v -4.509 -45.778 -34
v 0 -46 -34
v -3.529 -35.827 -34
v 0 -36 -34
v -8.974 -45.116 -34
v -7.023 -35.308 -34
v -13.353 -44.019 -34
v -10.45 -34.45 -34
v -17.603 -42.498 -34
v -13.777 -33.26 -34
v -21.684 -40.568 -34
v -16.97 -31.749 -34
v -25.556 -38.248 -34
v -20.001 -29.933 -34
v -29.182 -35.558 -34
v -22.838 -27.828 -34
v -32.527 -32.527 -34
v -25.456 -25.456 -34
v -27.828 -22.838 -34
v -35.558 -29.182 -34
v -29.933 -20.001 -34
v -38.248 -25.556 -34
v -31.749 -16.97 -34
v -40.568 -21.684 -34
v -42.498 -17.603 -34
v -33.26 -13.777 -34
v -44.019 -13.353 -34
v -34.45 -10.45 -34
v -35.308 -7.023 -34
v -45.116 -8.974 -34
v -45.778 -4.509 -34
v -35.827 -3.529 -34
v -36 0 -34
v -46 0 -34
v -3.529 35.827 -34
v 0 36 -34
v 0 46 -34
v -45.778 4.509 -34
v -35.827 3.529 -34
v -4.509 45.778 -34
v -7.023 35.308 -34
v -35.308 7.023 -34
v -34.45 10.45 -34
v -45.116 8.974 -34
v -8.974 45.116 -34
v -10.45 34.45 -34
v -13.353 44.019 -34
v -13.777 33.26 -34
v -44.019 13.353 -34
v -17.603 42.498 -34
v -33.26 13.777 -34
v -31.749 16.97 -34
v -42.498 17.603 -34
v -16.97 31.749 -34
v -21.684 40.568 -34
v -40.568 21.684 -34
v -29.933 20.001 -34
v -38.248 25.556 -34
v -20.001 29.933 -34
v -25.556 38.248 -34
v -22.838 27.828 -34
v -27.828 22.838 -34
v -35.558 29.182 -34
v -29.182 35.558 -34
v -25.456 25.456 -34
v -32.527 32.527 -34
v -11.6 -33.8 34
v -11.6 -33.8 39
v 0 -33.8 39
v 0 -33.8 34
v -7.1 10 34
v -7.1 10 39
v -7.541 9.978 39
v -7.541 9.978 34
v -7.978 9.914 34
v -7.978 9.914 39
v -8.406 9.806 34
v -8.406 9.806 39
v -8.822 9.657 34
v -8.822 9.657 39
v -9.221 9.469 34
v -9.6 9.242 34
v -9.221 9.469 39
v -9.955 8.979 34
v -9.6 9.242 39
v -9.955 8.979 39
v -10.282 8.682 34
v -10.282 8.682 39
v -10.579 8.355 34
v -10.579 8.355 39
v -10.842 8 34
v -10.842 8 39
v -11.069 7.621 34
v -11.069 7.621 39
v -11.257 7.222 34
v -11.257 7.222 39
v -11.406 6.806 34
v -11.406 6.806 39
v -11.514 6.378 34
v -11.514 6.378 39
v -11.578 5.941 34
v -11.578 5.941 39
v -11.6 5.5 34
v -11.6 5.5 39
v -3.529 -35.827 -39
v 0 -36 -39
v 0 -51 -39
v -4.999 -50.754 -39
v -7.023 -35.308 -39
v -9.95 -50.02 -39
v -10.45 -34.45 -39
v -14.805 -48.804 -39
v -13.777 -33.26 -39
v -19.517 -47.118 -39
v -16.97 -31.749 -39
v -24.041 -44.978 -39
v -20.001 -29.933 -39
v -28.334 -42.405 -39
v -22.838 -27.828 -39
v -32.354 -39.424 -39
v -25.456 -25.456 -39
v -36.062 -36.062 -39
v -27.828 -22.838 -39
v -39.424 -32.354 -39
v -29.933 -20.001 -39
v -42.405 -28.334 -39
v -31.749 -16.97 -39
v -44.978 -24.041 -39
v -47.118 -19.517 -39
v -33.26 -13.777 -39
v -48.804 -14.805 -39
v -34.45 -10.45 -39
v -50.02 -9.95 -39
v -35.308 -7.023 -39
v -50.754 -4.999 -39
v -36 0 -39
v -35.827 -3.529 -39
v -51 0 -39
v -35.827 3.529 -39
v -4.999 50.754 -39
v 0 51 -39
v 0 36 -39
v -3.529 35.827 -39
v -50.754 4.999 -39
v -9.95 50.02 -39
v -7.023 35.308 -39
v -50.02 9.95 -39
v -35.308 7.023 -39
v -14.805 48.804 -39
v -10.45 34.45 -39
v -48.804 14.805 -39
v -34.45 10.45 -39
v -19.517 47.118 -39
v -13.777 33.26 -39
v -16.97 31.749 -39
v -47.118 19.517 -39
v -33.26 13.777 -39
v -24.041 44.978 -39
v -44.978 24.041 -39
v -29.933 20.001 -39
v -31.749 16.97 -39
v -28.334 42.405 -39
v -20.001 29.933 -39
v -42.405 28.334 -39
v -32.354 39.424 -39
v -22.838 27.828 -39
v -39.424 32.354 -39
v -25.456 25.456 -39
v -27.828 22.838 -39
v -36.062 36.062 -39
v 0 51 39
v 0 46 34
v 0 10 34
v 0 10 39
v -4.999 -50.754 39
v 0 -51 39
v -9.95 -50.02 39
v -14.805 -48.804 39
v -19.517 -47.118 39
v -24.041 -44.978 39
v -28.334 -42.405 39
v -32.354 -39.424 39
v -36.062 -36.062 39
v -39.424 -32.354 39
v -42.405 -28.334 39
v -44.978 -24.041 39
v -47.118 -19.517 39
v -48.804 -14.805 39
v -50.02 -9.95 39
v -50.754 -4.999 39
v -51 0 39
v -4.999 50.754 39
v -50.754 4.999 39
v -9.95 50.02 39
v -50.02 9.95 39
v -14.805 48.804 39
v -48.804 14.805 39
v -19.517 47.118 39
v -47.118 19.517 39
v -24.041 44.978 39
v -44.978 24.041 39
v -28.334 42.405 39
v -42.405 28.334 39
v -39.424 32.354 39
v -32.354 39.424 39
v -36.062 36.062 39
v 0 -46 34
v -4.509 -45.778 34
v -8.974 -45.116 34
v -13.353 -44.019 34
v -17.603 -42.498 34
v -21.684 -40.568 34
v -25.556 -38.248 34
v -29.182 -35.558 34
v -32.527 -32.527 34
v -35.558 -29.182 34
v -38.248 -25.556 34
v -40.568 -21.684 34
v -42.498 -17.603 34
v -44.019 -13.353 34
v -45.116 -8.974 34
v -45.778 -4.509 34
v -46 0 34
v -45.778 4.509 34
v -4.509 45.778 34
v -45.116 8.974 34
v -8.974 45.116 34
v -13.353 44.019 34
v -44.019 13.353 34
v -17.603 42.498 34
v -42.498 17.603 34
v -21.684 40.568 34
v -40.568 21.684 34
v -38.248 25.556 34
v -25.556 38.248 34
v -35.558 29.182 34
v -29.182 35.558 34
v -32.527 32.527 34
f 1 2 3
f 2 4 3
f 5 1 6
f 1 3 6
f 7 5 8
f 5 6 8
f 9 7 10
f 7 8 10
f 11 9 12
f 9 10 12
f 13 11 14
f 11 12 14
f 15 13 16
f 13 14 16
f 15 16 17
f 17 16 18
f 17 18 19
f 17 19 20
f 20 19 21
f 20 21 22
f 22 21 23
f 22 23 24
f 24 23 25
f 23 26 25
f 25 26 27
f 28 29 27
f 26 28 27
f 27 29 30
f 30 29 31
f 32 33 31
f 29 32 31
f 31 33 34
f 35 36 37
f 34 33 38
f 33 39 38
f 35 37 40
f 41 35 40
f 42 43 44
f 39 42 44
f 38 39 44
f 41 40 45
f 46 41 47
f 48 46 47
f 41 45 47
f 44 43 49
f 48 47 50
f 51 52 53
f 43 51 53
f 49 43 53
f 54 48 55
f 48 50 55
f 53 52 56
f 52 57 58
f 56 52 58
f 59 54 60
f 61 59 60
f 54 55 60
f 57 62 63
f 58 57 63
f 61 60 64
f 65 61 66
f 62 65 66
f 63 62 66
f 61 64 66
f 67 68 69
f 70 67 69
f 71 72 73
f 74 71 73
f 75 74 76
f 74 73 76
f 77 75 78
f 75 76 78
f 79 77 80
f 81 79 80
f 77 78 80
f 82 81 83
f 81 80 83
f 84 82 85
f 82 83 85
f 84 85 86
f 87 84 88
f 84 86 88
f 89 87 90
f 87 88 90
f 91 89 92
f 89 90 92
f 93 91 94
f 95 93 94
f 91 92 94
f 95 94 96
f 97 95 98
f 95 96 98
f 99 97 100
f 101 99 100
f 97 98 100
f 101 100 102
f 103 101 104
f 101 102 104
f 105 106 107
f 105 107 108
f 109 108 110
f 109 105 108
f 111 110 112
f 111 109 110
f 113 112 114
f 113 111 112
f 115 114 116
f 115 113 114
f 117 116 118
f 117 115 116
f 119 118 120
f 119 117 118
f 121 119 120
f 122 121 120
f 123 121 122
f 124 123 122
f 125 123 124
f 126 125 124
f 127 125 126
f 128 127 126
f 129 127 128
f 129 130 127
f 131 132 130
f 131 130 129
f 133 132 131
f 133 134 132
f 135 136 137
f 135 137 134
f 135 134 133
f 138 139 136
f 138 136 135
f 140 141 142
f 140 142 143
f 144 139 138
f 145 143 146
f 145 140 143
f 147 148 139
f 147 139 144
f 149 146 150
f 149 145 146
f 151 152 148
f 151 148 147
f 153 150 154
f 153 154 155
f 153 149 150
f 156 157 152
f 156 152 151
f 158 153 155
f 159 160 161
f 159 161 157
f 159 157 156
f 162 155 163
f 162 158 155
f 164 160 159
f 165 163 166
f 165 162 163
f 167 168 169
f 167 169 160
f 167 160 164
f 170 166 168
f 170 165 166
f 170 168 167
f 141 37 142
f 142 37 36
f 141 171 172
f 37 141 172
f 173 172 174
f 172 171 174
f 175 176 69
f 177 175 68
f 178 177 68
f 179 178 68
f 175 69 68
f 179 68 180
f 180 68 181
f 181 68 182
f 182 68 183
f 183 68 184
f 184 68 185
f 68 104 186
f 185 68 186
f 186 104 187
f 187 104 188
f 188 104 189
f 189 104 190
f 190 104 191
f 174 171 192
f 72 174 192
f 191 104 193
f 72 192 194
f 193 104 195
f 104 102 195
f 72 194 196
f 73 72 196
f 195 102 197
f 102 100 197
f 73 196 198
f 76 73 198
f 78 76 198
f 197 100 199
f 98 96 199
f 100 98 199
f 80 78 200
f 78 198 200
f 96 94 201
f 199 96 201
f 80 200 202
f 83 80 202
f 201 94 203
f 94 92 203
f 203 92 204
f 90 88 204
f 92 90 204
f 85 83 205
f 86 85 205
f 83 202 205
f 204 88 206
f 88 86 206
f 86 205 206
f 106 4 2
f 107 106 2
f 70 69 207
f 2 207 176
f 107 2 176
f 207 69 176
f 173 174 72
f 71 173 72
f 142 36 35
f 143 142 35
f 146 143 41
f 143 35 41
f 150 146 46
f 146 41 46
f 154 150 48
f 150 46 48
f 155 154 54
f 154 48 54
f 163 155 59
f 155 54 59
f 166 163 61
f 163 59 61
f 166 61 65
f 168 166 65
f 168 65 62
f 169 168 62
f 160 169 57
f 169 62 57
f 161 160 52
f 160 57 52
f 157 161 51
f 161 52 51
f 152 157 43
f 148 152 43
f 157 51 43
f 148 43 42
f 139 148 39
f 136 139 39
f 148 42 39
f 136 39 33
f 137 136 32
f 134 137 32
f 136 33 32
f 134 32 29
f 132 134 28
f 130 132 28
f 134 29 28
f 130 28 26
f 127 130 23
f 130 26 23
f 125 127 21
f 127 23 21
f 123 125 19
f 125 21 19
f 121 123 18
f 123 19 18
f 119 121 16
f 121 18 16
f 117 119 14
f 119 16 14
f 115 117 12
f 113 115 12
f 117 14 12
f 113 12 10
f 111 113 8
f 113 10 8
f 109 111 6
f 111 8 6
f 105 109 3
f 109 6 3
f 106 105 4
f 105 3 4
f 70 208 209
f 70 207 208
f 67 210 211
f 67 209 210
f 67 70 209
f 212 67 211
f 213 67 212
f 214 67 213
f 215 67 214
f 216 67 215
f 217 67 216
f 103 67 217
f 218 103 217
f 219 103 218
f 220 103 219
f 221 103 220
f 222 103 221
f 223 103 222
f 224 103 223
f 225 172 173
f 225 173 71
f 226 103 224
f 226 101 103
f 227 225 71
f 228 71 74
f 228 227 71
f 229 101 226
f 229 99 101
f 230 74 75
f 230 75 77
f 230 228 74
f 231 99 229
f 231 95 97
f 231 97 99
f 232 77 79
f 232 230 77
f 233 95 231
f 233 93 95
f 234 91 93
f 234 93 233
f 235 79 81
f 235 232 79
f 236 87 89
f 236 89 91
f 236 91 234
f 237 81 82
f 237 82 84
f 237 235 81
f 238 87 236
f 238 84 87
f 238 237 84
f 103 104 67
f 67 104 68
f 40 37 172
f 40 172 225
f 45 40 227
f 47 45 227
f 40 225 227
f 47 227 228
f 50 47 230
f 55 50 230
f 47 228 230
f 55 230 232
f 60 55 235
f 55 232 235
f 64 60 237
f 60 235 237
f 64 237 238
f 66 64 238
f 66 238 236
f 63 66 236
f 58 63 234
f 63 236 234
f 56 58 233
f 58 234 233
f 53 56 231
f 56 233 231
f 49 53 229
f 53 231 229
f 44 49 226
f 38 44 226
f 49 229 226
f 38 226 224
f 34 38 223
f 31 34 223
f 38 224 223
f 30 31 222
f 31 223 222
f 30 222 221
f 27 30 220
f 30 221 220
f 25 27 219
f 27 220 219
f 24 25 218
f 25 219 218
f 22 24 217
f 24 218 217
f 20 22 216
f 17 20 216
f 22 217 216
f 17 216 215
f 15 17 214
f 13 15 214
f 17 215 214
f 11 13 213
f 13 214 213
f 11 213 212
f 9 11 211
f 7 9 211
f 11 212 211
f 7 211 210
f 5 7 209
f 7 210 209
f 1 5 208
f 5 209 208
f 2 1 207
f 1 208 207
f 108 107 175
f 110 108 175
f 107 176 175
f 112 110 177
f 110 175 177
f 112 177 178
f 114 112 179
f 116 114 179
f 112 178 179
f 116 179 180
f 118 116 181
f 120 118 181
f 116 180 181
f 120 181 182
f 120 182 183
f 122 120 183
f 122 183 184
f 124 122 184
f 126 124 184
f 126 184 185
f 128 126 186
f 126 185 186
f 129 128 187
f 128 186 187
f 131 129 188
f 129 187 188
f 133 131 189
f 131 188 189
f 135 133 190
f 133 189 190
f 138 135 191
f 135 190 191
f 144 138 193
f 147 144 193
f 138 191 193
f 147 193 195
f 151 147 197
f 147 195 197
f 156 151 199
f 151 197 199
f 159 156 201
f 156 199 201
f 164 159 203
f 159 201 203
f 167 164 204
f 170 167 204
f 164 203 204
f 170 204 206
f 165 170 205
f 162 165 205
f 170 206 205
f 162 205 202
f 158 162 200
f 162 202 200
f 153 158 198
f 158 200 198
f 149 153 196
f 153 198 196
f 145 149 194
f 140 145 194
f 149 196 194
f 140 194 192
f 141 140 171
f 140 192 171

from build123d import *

# Parameters (mm, degrees)
BOSS_EXTRU_1_DEPTH      = 34
BOSS_EXTRU_2_DEPTH      = 5
BOSS_EXTRU_3_DEPTH      = 5
ENL_V_MAT_EXTRU_1_DEPTH = 10


with BuildPart() as part:
    # Esquisse1 → Boss.-Extru.1 (new body, symmetric)
    with BuildSketch(Plane.XY):
        with BuildLine():
            Line((0, 51), (0, 46))
            ThreePointArc((0, 46), (-46, 0), (0, -46))
            Line((0, -46), (0, -51))
            ThreePointArc((0, -51), (-51, 0), (0, 51))
        make_face()
    extrude(amount=BOSS_EXTRU_1_DEPTH, both=True)

    # Esquisse2 → Boss.-Extru.2 (add)
    with BuildSketch(Plane.XY.offset(34)):
        with BuildLine():
            Line((0, 51), (0, -51))
            ThreePointArc((0, -51), (-51, 0), (0, 51))
        make_face()
    extrude(amount=BOSS_EXTRU_2_DEPTH)

    # Esquisse3 → Boss.-Extru.3 (add)
    with BuildSketch(Plane(origin=(0, 0, -34), x_dir=(-1, 0, 0), z_dir=(0, 0, -1))):
        with BuildLine():
            Line((0, 51), (0, 36))
            ThreePointArc((0, 36), (36, 0), (0, -36))
            Line((0, -36), (0, -51))
            ThreePointArc((0, -51), (51, 0), (0, 51))
        make_face()
    extrude(amount=BOSS_EXTRU_3_DEPTH)

    # Esquisse4 → Enlèv. mat.-Extru.1 (cut)
    with BuildSketch(Plane.XY.offset(39)):
        with BuildLine():
            Line((-11.59999996, 5.499999956), (-11.59999996, -2))
            Line((-11.59999996, -2), (-0.788986692, -2))
            ThreePointArc((-0.788986692, -2), (-2.112167134, 0.40155946), (0, 2.15))
            Line((0, 2.15), (0, 10.000000044))
            Line((0, 10.000000044), (-7.099999871, 10.000000044))
            ThreePointArc((-7.099999871, 10.000000044), (-10.281980449, 8.681980534), (-11.59999996, 5.499999956))
        make_face()
        with BuildLine():
            ThreePointArc((0, 2.15), (-2.112167134, 0.40155946), (-0.788986692, -2))
            Line((-0.788986692, -2), (0, -2))
            Line((0, -2), (0, 2.15))
        make_face()
        with BuildLine():
            Line((0, -2), (-0.788986692, -2))
            ThreePointArc((-0.788986692, -2), (-0.40155946, -2.112167134), (0, -2.15))
            Line((0, -2.15), (0, -2))
        make_face()
        with BuildLine():
            Line((0, 2.15), (0, -2))
            Line((0, -2), (0.788986692, -2))
            ThreePointArc((0.788986692, -2), (1.77747312, -1.209582286), (2.15, 0))
            ThreePointArc((2.15, 0), (1.52027958, 1.52027958), (0, 2.15))
        make_face()
        with BuildLine():
            Line((0.788986692, -2), (0, -2))
            Line((0, -2), (0, -2.15))
            ThreePointArc((0, -2.15), (0.40155946, -2.112167134), (0.788986692, -2))
        make_face()
        with BuildLine():
            Line((-0.788986692, -2), (-11.59999996, -2))
            Line((-11.59999996, -2), (-11.59999996, -33.8))
            Line((-11.59999996, -33.8), (0, -33.8))
            Line((0, -33.8), (0, -2.15))
            ThreePointArc((0, -2.15), (-0.40155946, -2.112167134), (-0.788986692, -2))
        make_face()
    extrude(amount=-ENL_V_MAT_EXTRU_1_DEPTH, mode=Mode.SUBTRACT)


solid = part.part
